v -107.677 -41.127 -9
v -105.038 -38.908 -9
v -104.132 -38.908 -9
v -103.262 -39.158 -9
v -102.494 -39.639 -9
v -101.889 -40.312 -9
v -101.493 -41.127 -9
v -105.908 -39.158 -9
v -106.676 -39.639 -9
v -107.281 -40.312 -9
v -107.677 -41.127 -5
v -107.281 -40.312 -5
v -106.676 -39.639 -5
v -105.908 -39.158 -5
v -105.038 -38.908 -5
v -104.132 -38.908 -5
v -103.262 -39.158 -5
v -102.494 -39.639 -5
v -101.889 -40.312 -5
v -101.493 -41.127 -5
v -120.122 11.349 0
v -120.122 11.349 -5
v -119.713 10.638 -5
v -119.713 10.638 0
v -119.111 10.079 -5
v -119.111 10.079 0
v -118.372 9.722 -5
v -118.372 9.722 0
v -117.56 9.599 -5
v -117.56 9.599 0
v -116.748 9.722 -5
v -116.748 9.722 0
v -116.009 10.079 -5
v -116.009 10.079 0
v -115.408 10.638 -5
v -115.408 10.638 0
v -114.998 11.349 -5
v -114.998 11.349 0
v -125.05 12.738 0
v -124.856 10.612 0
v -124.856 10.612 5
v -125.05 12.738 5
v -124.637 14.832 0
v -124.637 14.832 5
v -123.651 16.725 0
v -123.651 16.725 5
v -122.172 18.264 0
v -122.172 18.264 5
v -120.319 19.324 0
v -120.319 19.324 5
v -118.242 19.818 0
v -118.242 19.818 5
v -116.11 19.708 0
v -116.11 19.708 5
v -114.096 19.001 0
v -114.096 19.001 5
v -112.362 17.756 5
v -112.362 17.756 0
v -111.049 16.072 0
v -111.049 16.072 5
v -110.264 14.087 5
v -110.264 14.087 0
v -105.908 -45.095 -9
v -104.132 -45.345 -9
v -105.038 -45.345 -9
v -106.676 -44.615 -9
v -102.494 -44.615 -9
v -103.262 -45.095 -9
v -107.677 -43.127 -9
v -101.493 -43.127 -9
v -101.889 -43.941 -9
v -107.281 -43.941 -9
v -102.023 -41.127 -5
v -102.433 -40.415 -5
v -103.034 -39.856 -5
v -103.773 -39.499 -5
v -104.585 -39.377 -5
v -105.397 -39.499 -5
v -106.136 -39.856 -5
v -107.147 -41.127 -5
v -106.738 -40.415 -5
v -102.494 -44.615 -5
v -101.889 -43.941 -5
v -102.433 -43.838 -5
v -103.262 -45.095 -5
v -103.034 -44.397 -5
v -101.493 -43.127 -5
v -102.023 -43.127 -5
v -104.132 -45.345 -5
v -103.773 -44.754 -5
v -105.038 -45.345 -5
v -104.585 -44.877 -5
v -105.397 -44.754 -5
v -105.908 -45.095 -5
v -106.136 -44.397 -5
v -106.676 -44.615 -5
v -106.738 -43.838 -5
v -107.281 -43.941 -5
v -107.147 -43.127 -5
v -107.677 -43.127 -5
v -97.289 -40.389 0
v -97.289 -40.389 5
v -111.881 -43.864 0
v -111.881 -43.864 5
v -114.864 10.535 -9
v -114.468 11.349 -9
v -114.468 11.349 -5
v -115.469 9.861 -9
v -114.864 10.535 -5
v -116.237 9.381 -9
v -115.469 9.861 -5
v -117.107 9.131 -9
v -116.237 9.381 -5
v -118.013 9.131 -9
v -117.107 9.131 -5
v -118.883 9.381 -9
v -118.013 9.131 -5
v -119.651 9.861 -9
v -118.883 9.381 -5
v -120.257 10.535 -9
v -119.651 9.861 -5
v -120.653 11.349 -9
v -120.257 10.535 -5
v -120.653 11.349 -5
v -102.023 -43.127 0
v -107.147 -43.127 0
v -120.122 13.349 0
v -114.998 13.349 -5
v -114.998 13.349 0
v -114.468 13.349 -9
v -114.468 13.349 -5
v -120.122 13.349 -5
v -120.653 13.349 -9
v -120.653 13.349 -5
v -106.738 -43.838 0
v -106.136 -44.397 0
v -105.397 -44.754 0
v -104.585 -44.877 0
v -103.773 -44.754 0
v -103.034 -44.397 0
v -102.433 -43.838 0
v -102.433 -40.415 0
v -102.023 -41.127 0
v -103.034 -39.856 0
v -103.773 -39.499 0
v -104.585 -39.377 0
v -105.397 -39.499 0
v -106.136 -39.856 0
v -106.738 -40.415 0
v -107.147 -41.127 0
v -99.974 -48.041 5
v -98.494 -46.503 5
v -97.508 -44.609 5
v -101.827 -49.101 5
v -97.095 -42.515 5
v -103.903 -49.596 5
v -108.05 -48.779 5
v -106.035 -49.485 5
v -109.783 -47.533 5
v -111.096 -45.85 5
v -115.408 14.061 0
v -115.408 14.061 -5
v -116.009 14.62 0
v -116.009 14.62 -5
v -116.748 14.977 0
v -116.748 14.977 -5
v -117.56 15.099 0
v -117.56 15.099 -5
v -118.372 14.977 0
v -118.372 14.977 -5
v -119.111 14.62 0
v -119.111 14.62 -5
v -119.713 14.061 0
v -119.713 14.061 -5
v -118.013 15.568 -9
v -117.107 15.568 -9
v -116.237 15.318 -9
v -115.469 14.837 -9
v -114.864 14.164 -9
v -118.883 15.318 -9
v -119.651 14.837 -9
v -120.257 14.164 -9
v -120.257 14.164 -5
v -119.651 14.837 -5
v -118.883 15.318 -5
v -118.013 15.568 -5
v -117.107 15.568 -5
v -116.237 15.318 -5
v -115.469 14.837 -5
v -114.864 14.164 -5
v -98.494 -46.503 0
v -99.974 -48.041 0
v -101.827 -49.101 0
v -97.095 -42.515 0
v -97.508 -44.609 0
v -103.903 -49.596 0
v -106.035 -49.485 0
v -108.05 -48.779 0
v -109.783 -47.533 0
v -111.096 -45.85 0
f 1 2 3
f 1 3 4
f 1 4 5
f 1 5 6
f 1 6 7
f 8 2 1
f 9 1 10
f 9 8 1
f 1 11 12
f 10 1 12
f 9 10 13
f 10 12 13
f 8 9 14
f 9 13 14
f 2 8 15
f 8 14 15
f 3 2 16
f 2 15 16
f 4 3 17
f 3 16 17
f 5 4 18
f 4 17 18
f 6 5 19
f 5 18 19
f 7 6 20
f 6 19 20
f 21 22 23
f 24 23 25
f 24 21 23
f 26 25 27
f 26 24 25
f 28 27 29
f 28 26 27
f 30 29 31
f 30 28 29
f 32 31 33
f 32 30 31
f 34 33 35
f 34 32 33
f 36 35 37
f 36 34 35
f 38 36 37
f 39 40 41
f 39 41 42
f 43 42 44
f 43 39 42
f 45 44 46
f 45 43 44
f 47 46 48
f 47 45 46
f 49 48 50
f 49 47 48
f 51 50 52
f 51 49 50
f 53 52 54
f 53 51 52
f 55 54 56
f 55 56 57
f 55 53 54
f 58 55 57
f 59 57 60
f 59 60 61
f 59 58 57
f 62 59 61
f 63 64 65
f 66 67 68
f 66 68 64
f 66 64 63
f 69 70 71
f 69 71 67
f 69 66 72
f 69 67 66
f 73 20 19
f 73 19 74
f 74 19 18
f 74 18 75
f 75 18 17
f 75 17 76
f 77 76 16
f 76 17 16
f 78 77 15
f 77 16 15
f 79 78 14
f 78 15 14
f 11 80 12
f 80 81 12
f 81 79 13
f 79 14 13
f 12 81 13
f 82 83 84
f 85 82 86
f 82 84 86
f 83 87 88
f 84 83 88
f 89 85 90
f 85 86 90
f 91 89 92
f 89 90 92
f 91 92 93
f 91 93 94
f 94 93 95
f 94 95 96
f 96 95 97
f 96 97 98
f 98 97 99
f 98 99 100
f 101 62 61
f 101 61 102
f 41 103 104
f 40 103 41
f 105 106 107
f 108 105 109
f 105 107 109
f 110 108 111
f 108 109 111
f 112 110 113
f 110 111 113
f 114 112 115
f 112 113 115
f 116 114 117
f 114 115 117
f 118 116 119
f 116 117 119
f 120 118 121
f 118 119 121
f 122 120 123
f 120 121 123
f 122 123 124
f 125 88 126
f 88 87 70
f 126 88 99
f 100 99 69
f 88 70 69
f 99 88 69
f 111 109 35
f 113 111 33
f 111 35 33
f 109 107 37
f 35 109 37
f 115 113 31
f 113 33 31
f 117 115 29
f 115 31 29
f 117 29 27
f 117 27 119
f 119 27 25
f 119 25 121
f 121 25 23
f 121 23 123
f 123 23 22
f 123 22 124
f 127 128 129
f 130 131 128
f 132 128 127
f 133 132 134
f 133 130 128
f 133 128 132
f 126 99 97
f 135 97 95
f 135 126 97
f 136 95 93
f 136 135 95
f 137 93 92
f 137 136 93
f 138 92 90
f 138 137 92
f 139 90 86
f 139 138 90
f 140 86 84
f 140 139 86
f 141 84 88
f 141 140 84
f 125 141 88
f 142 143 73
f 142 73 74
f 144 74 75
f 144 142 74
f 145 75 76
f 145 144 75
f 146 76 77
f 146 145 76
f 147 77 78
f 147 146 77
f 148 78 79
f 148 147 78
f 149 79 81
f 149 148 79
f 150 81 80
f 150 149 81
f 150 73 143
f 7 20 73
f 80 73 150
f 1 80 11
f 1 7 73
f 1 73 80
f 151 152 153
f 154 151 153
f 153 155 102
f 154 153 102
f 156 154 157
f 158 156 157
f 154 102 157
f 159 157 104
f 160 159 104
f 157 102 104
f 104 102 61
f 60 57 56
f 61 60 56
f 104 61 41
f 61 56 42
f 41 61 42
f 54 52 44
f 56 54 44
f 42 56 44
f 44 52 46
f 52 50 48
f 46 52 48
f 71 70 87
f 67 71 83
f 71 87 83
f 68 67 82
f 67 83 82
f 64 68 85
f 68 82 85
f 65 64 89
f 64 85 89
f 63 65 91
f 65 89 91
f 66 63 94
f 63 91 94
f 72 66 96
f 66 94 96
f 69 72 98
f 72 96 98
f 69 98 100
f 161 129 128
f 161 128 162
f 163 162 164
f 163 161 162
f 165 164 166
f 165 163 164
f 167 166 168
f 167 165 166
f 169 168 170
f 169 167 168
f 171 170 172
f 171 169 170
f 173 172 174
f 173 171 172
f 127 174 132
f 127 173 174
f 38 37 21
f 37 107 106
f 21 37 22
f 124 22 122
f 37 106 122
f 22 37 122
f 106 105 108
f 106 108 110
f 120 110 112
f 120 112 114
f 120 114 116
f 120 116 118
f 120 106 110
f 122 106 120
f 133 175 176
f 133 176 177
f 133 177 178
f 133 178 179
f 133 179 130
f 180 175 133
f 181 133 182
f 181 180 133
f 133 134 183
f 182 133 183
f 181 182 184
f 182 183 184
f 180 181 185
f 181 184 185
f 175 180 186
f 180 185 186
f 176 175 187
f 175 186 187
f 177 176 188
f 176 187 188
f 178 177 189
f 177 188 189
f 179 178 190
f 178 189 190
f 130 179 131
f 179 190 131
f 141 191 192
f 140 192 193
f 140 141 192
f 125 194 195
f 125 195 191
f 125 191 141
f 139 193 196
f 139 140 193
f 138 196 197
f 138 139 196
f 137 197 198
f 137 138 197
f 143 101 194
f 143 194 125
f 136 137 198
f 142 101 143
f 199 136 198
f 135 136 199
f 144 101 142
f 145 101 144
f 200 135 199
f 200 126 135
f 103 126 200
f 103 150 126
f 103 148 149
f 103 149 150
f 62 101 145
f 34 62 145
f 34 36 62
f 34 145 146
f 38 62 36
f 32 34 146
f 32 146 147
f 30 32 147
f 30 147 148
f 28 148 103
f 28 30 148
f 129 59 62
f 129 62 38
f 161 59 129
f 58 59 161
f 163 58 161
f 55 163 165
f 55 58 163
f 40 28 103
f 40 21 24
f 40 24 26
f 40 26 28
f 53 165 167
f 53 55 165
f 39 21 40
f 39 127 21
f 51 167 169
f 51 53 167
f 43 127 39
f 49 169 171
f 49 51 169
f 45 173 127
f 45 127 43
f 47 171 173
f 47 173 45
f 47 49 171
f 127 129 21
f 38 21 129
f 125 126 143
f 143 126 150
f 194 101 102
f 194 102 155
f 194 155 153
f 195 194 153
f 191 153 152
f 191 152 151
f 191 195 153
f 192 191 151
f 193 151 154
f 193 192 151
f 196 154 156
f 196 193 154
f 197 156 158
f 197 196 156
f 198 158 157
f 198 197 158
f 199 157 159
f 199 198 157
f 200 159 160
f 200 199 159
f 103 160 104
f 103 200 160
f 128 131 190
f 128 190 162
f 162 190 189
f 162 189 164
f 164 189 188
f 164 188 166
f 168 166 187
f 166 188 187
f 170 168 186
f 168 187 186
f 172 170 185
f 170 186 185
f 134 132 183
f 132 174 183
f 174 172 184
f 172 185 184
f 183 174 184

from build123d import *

# Parameters (mm, degrees)
BOSS_EXTRU_1_DEPTH      = 5
ESQUISSE3_R             = 2.75
BOSS_EXTRU_2_DEPTH      = 5
ESQUISSE4_R             = 3.25
BOSS_EXTRU_3_DEPTH      = 4
ESQUISSE5_W             = 10
ESQUISSE5_H             = 2
ENL_V_MAT_EXTRU_1_DEPTH = 9


with BuildPart() as part:
    # Esquisse1 → Boss.-Extru.1 (new body)
    with BuildSketch(Plane.XY):
        with BuildLine():
            Line((-111.881065478, -43.864420881), (-124.856118958, 10.611702211))
            ThreePointArc((-124.856118958, 10.611702211), (-119.297939992, 19.645341931), (-110.264300273, 14.087162965))
            Line((-110.264300273, 14.087162965), (-97.289246792, -40.388960128))
            ThreePointArc((-97.289246792, -40.388960128), (-102.847425758, -49.422599847), (-111.881065478, -43.864420881))
        make_face()
    extrude(amount=BOSS_EXTRU_1_DEPTH)

    # Esquisse3 → Boss.-Extru.2 (add)
    with BuildSketch(Plane.XY):
        with Locations((-117.560209615, 12.349432588)):
            Circle(ESQUISSE3_R)
        with Locations((-104.585156135, -42.126690504)):
            Circle(ESQUISSE3_R)
    extrude(amount=-BOSS_EXTRU_2_DEPTH)

    # Esquisse4 → Boss.-Extru.3 (add)
    with BuildSketch(Plane(origin=(0, 0, -5), x_dir=(-1, 0, 0), z_dir=(0, 0, -1))):
        with Locations((117.560209615, 12.349432588)):
            Circle(ESQUISSE4_R)
        with Locations((104.585156135, -42.126690504)):
            Circle(ESQUISSE4_R)
    extrude(amount=BOSS_EXTRU_3_DEPTH)

    # Esquisse5 → Enlèv. mat.-Extru.1 (cut)
    with BuildSketch(Plane(origin=(0, 0, -9), x_dir=(-1, 0, 0), z_dir=(0, 0, -1))):
        with Locations((104.585156135, -42.126690504)):
            Rectangle(ESQUISSE5_W, ESQUISSE5_H)
        with Locations((117.560209615, 12.349432588)):
            Rectangle(ESQUISSE5_W, ESQUISSE5_H)
    extrude(amount=-ENL_V_MAT_EXTRU_1_DEPTH, mode=Mode.SUBTRACT)


solid = part.part
